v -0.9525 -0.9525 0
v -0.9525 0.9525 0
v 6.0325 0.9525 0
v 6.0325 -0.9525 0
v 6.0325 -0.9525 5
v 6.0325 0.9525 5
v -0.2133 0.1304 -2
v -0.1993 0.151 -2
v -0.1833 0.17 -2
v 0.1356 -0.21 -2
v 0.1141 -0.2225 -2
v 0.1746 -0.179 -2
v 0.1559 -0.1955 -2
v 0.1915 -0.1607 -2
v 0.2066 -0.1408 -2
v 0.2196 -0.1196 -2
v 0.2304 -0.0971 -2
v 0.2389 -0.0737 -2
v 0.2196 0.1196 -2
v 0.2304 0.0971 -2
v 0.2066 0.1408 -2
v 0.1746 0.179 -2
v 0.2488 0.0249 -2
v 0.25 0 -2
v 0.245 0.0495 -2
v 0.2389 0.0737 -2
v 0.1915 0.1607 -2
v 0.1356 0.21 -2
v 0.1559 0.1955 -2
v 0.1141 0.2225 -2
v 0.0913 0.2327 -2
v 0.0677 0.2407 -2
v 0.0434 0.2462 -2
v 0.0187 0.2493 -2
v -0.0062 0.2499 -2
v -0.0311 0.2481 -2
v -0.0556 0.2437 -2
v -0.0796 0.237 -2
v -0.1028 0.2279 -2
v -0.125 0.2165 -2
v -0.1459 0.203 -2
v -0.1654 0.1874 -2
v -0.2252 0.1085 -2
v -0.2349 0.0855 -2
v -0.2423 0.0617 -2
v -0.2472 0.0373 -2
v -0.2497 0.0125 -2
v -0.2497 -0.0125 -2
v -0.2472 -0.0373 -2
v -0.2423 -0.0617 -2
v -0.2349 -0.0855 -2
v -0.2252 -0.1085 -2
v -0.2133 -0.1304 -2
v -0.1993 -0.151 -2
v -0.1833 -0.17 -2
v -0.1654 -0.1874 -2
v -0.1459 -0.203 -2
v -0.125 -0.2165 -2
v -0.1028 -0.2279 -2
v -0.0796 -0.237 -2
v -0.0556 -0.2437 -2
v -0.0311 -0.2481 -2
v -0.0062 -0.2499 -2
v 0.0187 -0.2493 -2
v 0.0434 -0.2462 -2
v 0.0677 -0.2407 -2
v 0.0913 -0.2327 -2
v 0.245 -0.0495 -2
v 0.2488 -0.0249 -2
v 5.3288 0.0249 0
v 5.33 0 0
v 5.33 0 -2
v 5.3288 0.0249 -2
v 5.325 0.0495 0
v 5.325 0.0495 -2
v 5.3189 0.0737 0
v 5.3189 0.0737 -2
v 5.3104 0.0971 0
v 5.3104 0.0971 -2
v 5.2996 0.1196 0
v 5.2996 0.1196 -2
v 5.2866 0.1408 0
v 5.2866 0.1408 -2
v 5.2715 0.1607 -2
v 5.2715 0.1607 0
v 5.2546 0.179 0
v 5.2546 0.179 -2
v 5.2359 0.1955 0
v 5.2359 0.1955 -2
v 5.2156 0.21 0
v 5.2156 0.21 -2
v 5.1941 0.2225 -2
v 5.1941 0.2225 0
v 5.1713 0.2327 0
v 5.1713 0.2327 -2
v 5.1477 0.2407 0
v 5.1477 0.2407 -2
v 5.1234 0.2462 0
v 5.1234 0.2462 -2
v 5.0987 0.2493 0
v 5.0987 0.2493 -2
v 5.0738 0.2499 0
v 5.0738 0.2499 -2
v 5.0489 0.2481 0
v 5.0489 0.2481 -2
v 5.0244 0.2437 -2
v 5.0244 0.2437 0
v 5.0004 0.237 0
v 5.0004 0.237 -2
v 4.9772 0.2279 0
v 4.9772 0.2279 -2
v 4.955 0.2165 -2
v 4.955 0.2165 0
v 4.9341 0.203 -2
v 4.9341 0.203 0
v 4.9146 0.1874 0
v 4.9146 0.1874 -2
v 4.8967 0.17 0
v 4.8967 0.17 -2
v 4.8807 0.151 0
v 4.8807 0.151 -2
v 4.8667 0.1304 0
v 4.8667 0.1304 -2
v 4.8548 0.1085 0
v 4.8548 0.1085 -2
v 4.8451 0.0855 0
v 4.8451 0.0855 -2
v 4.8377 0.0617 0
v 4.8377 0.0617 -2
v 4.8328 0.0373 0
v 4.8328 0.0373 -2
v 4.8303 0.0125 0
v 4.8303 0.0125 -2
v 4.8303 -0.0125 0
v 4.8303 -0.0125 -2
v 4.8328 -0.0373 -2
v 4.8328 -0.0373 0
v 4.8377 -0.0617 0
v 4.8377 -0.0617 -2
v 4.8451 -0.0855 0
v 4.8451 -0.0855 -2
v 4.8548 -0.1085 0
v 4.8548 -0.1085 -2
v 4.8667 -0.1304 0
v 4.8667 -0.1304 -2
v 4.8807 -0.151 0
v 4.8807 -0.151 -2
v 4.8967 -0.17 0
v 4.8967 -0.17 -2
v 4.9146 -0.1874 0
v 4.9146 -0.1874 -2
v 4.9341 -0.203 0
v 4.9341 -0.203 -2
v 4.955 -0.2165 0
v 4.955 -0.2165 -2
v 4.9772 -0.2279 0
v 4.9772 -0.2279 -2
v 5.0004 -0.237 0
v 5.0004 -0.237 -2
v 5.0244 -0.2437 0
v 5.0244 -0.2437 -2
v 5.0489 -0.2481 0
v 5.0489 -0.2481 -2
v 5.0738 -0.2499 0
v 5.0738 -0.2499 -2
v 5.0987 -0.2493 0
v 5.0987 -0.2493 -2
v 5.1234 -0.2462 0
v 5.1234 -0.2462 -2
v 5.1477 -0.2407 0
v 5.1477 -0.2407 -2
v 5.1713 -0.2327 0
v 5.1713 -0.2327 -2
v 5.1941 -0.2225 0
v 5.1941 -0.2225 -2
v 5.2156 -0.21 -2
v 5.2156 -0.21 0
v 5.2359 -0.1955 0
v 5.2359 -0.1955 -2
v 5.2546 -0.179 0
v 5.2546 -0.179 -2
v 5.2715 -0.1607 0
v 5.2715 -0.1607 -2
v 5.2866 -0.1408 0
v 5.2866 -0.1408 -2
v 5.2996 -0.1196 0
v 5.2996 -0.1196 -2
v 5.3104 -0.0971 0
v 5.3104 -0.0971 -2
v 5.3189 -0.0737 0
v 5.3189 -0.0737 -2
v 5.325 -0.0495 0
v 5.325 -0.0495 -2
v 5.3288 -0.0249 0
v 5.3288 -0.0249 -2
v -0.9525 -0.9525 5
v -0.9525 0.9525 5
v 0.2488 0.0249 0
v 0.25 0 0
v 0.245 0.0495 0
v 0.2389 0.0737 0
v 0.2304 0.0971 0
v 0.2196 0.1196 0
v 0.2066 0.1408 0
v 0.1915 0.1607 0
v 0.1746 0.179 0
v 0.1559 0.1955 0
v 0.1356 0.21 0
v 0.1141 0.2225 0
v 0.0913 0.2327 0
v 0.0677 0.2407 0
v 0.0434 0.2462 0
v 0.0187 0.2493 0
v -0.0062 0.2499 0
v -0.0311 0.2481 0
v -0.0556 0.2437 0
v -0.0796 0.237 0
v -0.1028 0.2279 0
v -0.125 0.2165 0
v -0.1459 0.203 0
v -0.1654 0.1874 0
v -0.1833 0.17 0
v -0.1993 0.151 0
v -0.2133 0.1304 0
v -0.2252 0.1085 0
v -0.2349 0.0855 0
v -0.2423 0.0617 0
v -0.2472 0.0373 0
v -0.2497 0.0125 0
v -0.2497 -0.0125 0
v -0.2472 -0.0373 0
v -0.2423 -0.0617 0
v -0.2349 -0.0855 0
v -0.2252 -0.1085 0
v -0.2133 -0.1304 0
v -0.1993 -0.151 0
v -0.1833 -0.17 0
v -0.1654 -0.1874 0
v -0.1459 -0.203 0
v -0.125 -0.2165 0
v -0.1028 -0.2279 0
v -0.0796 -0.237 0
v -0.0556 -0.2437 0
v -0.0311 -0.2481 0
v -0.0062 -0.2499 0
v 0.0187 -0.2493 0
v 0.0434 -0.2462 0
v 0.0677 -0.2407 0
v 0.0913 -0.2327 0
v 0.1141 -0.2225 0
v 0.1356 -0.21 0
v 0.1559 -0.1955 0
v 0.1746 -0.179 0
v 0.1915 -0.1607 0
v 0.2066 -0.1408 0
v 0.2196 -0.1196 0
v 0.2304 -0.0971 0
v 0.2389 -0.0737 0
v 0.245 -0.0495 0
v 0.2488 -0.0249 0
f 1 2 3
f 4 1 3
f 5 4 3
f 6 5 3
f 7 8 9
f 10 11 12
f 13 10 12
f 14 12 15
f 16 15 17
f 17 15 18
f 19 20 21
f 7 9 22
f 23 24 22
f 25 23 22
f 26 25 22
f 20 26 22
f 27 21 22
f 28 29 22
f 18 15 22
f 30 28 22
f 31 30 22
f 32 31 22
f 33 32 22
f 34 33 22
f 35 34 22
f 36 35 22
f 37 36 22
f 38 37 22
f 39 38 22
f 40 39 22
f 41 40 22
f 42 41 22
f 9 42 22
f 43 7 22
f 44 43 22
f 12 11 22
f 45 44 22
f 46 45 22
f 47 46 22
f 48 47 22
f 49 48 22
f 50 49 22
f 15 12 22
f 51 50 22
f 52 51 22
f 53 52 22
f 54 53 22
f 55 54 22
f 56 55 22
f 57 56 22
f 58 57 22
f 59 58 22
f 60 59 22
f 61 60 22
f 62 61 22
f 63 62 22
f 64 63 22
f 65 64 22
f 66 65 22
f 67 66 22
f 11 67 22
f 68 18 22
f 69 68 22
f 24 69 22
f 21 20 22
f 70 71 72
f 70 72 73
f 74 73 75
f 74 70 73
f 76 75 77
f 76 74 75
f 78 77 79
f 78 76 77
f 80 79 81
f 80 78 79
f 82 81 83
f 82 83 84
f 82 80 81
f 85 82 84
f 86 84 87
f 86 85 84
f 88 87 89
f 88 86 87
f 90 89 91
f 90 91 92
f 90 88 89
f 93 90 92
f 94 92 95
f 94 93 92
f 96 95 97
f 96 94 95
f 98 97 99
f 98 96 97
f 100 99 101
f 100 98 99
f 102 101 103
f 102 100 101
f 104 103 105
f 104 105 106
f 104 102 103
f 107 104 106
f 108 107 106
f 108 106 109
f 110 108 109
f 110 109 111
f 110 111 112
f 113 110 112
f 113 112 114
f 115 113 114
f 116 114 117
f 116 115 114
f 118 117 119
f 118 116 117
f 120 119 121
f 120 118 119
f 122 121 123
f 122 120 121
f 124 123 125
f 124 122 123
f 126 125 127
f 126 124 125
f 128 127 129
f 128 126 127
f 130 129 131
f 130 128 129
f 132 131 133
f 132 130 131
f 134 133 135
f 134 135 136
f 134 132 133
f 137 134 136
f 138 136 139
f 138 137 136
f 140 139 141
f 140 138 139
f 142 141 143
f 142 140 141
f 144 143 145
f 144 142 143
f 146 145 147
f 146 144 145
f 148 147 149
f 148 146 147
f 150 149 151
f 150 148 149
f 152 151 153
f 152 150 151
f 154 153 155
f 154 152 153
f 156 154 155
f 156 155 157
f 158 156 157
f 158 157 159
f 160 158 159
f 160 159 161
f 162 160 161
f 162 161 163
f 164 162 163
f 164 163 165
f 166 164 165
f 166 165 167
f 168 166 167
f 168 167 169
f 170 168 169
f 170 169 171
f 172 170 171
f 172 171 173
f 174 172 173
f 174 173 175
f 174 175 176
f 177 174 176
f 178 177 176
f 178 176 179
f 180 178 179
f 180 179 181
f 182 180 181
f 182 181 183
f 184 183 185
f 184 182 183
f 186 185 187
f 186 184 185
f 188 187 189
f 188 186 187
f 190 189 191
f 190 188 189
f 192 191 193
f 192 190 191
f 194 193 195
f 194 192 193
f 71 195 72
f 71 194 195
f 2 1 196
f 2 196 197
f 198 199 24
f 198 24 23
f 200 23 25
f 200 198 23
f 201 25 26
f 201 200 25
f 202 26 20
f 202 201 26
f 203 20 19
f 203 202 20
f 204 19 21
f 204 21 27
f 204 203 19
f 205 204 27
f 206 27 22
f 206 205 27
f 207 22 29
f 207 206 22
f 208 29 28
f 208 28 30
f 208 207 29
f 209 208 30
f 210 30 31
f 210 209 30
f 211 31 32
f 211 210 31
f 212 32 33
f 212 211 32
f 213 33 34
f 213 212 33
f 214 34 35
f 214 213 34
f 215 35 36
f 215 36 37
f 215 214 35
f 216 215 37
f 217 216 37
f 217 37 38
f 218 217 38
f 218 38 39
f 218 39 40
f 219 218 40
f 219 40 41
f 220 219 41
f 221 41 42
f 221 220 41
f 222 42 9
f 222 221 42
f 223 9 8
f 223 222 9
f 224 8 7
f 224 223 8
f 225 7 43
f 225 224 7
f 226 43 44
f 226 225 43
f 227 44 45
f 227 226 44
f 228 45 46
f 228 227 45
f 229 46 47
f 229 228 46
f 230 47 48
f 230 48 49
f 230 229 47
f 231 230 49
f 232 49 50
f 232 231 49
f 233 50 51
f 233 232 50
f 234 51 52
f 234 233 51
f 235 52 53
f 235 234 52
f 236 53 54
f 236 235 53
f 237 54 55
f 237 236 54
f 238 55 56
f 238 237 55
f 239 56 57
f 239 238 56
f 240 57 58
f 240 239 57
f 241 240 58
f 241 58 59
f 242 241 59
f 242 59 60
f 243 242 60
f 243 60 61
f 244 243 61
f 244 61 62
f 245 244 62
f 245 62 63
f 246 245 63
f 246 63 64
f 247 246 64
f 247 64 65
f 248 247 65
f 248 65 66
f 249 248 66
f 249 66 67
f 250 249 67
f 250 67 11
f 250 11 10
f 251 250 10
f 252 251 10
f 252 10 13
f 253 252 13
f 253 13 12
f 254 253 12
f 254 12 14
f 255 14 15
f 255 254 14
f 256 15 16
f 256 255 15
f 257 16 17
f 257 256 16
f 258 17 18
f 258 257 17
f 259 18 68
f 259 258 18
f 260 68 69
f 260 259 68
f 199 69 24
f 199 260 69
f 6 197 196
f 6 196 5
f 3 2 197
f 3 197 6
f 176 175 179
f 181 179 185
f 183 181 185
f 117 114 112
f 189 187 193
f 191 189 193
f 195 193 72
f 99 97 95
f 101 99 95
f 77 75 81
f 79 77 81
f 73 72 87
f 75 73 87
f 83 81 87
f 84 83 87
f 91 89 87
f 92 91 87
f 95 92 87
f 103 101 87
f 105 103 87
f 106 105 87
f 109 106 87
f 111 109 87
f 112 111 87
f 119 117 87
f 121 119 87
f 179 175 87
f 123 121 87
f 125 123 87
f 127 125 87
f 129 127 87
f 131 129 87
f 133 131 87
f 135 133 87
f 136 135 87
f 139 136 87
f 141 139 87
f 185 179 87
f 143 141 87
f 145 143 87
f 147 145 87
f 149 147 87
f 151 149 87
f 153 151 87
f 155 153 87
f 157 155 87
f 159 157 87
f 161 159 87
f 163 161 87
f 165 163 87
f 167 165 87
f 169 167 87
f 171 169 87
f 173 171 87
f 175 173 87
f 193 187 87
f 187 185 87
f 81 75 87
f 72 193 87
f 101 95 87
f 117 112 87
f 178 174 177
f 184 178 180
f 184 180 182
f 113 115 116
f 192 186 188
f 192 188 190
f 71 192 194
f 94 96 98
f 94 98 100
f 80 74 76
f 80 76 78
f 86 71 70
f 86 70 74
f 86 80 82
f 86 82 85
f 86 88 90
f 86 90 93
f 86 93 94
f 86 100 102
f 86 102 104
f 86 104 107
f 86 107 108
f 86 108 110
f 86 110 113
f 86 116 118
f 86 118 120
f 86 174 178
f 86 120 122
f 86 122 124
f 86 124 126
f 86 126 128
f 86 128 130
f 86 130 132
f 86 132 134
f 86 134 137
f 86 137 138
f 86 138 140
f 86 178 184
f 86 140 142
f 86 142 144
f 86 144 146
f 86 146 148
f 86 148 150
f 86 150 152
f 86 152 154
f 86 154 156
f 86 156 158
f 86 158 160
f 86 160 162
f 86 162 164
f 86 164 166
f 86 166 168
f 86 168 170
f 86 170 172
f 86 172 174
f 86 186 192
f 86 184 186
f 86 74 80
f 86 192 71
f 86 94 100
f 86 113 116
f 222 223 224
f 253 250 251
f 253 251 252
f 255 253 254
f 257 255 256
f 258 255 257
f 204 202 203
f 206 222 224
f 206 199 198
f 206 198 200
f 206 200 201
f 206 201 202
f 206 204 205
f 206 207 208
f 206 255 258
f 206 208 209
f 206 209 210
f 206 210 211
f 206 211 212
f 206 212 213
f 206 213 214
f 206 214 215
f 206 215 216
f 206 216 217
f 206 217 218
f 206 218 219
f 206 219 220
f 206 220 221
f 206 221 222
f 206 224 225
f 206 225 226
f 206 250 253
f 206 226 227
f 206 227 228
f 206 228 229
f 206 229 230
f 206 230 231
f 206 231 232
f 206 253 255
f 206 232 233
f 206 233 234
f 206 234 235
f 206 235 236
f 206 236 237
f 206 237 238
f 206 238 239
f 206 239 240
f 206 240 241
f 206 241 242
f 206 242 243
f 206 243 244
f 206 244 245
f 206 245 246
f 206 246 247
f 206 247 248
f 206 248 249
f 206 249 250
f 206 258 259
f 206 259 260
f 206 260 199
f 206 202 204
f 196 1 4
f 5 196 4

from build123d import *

# Parameters (mm, degrees)
SKETCH1_W               = 6.985
SKETCH1_H               = 1.905
COMPONENT_OUTLINE_DEPTH = 5
SKETCH2_R               = 0.25
EXTRUDE_1_DEPTH         = 2
SKETCH3_R               = 0.25
EXTRUDE_2_DEPTH         = 2


with BuildPart() as part:
    # Sketch1 → Component_Outline (new body)
    with BuildSketch(Plane.XY):
        with Locations((2.54, 0)):
            Rectangle(SKETCH1_W, SKETCH1_H)
    extrude(amount=COMPONENT_OUTLINE_DEPTH)


with BuildPart() as body_2:
    # Sketch2 → Extrude 1 (new body)
    with BuildSketch(Plane.XY):
        Circle(SKETCH2_R)
    extrude(amount=-EXTRUDE_1_DEPTH)


with BuildPart() as body_3:
    # Sketch3 → Extrude 2 (new body)
    with BuildSketch(Plane.XY):
        with Locations((5.08, 0)):
            Circle(SKETCH3_R)
    extrude(amount=-EXTRUDE_2_DEPTH)


solid = Compound([part.part, body_2.part, body_3.part])
